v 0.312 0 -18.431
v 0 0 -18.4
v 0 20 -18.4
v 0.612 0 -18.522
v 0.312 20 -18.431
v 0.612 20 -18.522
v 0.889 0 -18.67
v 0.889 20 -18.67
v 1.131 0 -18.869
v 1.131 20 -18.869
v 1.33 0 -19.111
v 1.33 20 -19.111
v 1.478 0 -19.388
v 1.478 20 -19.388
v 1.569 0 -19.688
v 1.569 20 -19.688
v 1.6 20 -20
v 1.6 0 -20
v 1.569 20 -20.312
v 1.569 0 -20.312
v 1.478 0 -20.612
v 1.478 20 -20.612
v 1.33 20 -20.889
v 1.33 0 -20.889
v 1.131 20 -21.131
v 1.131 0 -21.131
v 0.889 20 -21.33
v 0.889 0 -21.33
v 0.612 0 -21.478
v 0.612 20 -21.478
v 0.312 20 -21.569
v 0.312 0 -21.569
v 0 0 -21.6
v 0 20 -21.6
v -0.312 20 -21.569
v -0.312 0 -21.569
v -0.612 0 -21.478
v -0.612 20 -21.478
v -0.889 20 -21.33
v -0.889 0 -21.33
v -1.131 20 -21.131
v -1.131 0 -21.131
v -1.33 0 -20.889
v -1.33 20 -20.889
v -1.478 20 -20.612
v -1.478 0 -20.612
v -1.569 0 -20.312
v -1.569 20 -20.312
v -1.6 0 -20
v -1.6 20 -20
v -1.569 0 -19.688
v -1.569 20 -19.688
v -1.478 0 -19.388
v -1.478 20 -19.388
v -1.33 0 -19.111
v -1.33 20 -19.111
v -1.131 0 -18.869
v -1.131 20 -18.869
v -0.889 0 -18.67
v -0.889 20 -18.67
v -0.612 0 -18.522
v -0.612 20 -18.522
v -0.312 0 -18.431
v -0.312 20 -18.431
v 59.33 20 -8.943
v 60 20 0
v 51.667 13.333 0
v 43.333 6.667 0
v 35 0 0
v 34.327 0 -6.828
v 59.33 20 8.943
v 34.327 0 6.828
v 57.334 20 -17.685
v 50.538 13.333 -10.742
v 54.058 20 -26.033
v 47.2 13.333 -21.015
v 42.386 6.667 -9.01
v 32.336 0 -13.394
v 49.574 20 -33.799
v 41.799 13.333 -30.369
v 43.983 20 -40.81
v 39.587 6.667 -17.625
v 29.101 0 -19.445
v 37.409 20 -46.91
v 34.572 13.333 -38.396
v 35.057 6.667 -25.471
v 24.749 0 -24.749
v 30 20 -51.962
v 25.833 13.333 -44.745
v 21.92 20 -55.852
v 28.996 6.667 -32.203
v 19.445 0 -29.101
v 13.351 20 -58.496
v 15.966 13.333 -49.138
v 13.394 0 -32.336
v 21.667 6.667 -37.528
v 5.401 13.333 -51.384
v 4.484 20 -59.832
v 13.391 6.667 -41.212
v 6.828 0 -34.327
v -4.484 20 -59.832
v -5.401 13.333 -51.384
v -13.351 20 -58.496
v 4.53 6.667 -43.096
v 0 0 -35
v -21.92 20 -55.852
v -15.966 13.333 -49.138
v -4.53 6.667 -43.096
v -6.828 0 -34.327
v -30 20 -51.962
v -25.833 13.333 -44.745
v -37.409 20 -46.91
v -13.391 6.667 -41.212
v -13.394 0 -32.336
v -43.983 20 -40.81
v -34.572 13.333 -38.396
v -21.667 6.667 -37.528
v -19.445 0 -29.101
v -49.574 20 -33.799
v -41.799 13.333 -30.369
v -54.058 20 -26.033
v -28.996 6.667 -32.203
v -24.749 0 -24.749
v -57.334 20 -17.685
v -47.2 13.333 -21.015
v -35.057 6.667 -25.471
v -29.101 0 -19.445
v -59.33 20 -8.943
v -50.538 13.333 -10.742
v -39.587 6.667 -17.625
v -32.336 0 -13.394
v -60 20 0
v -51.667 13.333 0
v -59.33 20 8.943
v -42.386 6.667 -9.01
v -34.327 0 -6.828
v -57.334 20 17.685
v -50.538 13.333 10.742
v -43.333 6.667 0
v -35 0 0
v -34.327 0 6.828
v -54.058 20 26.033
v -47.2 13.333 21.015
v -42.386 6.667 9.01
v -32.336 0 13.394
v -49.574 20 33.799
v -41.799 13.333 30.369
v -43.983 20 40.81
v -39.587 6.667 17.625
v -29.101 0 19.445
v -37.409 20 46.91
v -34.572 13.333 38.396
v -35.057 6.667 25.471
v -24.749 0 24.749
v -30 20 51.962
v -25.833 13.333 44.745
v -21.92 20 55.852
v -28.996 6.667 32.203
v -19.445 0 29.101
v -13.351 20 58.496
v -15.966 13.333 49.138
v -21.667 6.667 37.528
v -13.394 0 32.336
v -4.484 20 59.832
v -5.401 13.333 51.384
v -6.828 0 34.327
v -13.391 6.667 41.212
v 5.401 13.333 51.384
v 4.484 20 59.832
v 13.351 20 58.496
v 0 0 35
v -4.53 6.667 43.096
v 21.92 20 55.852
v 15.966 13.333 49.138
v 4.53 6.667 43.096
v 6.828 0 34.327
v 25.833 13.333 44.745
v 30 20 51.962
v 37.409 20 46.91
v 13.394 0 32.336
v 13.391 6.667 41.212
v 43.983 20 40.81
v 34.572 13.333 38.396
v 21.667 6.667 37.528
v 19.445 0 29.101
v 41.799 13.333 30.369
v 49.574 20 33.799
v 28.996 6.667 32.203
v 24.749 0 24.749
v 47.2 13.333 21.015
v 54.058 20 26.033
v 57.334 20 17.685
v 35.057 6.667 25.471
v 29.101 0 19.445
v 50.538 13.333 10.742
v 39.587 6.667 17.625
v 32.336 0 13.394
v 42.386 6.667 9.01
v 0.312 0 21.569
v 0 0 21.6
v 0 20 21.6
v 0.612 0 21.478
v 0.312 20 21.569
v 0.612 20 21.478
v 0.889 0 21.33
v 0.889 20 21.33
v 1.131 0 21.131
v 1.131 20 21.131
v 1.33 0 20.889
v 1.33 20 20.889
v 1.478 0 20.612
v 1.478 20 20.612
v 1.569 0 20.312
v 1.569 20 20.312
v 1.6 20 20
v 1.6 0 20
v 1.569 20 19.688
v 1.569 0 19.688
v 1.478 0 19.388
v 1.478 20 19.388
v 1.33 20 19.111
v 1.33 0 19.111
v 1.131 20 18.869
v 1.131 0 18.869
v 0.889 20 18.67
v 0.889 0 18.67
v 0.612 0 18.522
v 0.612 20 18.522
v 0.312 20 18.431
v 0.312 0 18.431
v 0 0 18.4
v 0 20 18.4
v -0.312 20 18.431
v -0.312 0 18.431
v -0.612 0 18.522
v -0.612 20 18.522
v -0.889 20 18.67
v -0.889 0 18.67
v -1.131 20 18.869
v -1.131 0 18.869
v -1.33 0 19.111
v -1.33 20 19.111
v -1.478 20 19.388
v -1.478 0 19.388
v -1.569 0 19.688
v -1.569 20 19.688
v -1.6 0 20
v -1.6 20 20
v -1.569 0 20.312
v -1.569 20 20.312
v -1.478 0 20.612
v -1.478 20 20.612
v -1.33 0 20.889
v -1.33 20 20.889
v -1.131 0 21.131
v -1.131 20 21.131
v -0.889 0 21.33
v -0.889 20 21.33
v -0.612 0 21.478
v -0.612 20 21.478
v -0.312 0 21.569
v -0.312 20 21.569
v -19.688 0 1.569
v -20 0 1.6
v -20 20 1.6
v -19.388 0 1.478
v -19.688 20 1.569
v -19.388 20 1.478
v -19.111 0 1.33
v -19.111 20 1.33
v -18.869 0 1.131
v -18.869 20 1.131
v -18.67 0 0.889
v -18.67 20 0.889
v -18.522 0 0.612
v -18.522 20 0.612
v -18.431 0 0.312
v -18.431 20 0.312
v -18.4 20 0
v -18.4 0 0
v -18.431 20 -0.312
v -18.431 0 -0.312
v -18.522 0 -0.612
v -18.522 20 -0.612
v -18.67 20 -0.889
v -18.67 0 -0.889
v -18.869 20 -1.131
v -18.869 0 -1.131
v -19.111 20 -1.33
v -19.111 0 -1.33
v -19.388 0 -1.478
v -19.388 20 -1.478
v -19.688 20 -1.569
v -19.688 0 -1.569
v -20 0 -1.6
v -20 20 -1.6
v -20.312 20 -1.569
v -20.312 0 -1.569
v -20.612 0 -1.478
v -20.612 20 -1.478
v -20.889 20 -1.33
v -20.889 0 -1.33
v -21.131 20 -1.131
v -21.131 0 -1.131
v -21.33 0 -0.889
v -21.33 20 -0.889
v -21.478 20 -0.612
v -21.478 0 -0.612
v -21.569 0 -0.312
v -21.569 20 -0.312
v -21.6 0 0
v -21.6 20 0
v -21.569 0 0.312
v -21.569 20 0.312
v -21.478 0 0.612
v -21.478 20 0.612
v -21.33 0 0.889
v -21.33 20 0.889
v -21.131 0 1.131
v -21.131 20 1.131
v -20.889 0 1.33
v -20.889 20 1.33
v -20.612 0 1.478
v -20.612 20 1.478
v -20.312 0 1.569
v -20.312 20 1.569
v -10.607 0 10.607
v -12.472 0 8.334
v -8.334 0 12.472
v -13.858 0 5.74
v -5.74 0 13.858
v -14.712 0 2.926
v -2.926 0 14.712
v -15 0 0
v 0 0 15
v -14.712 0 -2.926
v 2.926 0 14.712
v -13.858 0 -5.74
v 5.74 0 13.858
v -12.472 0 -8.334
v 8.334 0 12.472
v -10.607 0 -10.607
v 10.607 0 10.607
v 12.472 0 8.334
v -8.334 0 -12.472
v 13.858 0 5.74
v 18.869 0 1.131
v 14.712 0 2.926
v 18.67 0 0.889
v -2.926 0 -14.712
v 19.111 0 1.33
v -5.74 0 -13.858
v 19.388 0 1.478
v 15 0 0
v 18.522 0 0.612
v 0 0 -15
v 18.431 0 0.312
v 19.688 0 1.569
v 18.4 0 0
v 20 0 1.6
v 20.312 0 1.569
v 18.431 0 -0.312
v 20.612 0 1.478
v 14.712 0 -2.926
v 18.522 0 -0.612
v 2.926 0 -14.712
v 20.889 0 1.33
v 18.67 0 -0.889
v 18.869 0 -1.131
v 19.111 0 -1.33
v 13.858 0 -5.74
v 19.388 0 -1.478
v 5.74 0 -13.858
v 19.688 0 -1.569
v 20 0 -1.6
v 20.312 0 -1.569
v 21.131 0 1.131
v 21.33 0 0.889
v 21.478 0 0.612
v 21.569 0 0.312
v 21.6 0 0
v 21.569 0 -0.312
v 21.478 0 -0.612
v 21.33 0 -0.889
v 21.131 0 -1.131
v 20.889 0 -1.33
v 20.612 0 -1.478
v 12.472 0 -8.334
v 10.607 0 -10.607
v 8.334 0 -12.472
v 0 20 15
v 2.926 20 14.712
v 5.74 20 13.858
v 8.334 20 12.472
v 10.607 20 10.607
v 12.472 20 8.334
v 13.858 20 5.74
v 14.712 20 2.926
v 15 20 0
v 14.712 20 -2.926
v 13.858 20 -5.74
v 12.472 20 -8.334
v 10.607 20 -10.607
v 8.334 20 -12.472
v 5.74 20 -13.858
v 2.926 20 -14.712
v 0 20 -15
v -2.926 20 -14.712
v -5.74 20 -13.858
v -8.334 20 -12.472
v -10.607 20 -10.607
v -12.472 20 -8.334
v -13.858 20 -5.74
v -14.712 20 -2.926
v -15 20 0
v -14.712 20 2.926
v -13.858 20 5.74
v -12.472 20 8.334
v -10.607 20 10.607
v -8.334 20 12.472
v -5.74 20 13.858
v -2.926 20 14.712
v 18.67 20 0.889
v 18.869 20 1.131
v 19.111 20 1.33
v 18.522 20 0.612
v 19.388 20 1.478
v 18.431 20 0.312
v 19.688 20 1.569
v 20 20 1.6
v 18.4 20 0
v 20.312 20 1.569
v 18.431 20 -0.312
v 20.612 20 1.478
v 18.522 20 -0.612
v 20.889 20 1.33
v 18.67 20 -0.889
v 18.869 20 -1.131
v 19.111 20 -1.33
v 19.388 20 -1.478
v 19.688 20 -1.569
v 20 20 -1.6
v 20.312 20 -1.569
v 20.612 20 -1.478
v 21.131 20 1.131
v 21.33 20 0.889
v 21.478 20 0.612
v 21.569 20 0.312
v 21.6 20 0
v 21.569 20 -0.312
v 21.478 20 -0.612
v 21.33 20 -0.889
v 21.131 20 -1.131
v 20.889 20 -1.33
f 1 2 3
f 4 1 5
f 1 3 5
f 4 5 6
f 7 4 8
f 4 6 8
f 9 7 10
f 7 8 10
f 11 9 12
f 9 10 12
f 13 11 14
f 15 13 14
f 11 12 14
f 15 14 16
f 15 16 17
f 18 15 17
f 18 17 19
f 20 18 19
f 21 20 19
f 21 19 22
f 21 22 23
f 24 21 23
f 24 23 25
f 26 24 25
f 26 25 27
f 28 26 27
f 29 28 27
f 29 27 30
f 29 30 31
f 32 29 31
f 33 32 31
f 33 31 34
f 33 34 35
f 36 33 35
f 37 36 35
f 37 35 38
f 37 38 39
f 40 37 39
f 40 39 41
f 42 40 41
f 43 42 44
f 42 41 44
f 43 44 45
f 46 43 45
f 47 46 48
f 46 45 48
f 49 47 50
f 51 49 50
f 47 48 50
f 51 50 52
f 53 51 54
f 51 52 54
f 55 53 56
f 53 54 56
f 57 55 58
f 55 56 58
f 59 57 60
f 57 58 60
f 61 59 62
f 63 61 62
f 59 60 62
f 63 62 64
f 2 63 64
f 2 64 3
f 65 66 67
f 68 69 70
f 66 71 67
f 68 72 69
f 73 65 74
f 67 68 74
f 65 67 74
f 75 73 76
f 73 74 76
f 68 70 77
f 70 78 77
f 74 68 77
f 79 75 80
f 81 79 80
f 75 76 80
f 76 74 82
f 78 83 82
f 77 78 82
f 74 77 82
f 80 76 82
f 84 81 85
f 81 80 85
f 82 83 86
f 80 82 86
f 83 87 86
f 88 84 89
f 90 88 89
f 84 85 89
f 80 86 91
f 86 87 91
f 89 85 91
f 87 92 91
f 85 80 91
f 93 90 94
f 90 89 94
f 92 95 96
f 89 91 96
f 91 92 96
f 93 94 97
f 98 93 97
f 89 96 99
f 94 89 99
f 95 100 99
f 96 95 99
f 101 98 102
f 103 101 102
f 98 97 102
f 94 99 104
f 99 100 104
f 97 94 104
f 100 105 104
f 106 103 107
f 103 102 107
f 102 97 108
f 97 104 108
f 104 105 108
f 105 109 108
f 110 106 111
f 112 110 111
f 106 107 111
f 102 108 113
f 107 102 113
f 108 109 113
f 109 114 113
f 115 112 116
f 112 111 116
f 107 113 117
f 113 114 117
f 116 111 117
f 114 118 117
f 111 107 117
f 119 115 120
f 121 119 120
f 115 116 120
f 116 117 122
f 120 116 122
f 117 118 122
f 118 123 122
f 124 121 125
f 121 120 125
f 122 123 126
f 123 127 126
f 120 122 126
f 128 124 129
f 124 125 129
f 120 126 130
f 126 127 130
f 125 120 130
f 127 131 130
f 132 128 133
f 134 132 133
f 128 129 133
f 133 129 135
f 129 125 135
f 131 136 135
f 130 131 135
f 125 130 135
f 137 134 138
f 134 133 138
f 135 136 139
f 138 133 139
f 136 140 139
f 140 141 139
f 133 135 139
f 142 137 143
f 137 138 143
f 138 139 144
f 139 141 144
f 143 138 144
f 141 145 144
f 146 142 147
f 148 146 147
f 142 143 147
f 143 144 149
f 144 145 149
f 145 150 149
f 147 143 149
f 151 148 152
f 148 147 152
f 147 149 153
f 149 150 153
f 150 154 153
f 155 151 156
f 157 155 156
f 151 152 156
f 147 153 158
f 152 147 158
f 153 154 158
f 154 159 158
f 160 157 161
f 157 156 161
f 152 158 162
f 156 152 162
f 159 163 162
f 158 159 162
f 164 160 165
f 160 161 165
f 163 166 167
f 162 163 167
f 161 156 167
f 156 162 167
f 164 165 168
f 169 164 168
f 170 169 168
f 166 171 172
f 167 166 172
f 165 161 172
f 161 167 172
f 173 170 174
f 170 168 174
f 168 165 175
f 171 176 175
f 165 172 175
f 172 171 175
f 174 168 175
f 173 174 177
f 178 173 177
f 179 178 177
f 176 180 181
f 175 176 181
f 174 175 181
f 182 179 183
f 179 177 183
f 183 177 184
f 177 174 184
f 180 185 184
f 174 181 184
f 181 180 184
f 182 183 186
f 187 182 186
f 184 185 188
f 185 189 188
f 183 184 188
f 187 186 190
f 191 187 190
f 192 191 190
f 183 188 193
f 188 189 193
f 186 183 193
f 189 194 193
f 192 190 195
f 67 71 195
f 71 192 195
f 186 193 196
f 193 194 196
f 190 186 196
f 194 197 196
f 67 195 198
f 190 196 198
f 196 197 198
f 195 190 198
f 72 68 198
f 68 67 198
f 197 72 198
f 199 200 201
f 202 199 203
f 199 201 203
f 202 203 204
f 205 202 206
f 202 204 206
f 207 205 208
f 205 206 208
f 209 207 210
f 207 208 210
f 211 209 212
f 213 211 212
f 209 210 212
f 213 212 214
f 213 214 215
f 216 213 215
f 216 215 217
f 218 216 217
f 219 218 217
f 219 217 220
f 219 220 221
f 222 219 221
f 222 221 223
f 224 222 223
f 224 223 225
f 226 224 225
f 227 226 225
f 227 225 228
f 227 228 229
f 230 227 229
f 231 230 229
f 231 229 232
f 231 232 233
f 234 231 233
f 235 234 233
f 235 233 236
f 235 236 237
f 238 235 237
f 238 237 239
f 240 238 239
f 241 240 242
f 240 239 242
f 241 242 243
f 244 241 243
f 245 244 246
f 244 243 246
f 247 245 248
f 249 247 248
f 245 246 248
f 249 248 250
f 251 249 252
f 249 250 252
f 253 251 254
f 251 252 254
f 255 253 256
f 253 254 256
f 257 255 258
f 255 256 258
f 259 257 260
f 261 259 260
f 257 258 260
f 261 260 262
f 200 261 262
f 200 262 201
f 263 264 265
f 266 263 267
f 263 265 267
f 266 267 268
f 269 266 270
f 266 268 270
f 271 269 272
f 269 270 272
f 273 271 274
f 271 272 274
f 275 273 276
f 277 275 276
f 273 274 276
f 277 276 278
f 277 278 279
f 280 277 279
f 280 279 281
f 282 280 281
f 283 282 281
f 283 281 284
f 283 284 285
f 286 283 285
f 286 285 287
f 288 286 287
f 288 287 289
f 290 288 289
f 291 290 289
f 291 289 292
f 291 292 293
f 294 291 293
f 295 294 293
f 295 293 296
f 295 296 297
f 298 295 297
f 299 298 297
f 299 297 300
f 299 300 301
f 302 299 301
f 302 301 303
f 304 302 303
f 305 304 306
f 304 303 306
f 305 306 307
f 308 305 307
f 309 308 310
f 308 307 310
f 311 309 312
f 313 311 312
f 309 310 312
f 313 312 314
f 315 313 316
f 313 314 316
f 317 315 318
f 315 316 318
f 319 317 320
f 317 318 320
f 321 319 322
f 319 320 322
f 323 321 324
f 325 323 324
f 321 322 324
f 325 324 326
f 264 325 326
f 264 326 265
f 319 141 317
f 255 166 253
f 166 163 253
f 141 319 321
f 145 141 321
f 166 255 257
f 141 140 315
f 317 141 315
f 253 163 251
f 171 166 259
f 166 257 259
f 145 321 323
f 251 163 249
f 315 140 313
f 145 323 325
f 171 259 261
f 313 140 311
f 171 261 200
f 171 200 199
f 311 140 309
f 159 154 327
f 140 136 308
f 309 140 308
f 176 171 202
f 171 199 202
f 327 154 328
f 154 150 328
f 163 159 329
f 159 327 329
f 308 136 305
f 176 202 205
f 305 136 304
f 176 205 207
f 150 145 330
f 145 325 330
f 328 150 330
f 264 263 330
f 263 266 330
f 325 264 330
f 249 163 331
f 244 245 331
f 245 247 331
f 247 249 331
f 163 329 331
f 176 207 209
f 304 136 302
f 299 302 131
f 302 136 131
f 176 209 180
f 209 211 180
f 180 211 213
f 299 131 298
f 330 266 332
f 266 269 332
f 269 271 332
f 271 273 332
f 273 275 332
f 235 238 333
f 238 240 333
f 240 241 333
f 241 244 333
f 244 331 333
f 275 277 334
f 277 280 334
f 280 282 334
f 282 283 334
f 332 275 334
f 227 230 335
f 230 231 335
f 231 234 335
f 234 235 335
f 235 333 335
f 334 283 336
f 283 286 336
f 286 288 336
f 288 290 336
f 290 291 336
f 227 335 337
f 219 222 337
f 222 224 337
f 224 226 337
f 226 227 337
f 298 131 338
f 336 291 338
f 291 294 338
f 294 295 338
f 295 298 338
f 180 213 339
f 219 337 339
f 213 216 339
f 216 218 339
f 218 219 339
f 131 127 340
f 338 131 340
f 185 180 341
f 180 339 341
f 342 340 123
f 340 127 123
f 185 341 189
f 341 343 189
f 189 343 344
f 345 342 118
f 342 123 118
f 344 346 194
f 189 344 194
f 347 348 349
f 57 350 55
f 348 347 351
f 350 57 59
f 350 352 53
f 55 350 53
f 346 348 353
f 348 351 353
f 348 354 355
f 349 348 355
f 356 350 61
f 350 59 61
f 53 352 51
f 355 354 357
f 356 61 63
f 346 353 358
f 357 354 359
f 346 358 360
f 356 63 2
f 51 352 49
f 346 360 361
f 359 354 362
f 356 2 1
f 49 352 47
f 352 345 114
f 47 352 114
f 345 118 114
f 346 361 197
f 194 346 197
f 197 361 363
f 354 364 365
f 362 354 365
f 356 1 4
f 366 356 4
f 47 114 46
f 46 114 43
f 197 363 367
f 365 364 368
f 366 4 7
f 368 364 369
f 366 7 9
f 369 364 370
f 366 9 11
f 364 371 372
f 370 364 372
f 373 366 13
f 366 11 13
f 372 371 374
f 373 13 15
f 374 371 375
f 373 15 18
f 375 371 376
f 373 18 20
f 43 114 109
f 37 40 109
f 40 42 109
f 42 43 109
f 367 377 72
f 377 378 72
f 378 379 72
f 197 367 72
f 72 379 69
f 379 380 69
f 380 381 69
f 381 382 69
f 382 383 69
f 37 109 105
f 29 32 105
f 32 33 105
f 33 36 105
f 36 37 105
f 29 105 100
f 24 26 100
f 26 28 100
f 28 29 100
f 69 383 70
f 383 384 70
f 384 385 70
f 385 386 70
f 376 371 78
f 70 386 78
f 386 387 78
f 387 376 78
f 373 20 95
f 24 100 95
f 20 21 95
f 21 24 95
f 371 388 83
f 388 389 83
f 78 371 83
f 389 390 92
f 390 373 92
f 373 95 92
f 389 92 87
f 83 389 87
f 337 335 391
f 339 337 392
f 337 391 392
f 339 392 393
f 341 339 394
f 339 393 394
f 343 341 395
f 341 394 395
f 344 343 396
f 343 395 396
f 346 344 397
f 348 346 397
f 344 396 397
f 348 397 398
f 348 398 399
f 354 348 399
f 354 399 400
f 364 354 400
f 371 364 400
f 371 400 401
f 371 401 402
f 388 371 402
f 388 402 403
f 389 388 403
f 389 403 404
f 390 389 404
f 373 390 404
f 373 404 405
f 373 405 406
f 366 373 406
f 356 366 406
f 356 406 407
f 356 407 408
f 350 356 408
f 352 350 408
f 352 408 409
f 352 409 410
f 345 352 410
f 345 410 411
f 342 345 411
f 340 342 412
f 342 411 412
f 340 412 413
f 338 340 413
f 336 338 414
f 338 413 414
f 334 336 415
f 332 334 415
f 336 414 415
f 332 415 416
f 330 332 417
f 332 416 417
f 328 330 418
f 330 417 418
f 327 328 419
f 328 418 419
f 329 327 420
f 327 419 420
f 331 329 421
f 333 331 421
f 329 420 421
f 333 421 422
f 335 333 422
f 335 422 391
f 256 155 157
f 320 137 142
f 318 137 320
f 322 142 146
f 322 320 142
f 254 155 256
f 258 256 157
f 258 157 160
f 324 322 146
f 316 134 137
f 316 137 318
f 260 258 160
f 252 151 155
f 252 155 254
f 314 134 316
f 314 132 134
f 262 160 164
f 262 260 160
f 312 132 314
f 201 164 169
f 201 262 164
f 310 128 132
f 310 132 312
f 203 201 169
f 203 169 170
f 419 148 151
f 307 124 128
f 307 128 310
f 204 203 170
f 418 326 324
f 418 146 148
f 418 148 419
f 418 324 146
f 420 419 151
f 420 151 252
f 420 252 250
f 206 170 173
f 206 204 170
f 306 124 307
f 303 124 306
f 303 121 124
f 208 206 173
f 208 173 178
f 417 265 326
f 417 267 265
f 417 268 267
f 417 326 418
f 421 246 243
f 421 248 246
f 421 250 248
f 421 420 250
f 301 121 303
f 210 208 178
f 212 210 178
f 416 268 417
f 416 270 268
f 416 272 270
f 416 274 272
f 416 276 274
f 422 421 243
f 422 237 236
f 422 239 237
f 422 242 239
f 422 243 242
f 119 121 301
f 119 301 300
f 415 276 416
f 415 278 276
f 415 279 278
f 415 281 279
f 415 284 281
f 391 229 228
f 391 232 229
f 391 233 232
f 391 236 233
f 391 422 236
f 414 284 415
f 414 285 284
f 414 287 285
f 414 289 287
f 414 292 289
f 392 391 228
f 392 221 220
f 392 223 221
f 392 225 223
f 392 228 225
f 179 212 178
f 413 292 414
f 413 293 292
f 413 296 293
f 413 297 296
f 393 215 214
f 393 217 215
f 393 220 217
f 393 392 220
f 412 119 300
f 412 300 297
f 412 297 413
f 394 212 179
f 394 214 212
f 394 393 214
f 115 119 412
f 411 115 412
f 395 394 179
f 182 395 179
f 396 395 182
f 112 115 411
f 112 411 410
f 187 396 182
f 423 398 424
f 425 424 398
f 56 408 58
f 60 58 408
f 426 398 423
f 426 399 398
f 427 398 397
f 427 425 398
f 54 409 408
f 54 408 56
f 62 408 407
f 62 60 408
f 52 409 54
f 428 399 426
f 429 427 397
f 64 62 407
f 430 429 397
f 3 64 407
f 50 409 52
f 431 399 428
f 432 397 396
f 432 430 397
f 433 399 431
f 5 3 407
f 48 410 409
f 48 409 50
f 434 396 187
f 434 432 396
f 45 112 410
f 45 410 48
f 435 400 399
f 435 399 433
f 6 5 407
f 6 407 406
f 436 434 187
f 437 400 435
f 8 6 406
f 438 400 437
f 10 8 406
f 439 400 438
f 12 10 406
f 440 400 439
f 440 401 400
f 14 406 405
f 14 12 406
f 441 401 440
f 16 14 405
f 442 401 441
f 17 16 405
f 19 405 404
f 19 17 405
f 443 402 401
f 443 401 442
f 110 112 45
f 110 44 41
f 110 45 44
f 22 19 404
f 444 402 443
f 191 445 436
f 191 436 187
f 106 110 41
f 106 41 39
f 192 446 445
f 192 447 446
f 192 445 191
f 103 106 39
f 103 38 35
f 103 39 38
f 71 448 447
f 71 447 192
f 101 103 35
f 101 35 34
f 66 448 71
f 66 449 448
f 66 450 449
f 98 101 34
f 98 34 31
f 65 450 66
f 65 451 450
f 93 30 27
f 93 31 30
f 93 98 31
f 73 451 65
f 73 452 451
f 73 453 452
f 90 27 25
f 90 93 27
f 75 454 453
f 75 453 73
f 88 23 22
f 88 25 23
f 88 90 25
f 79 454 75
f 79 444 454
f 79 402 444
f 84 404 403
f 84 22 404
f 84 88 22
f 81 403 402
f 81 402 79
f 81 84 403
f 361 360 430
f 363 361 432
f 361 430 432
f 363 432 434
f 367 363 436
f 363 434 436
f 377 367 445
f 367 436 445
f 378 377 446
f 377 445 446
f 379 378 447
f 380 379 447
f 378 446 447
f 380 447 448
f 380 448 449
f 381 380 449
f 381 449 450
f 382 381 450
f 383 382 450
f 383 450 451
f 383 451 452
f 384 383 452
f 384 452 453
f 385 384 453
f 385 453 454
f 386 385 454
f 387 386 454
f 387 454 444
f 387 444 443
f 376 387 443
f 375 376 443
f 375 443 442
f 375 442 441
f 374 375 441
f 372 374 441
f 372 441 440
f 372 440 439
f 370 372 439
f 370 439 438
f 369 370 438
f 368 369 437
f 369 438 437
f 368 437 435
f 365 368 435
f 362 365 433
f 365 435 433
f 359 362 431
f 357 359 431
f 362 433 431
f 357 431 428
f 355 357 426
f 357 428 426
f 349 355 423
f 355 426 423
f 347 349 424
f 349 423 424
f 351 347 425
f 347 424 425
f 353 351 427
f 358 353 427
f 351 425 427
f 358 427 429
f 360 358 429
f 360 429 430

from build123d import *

# Parameters (mm, degrees)
SKETCH_2_R          = 60
SKETCH_1_R          = 35
SKETCH_3_R          = 1.6
SKETCH_3_R_2        = 15
CUT_EXTRUDE_1_DEPTH = 88.177979031


with BuildPart() as part:
    # ｽｹｯﾁ2 → ﾛﾌﾄ1 section 0
    with BuildSketch(Plane(origin=(0, 20, 0), x_dir=(1, 0, 0), z_dir=(0, 1, 0))):
        Circle(SKETCH_2_R)
    # ｽｹｯﾁ1 → ﾛﾌﾄ1 section 1
    with BuildSketch(Plane(origin=(0, 0, 0), x_dir=(1, 0, 0), z_dir=(0, 1, 0))):
        Circle(SKETCH_1_R)
    loft()

    # ｽｹｯﾁ3 → ｶｯﾄ - 押し出し1 (cut, through all)
    with BuildSketch(Plane(origin=(0, 20, 0), x_dir=(1, 0, 0), z_dir=(0, 1, 0))):
        with Locations(Location((0, 20, 0), (0, 0, 270))):
            Circle(SKETCH_3_R)
        with Locations(Location((20, 0, 0), (0, 0, 270))):
            Circle(SKETCH_3_R)
        with Locations(Location((0, -20, 0), (0, 0, 270))):
            Circle(SKETCH_3_R)
        with Locations(Location((-20, 0, 0), (0, 0, 270))):
            Circle(SKETCH_3_R)
        with Locations(Location((0, 0, 0), (0, 0, 270))):
            Circle(SKETCH_3_R_2)
    extrude(amount=-CUT_EXTRUDE_1_DEPTH, mode=Mode.SUBTRACT)


solid = part.part
